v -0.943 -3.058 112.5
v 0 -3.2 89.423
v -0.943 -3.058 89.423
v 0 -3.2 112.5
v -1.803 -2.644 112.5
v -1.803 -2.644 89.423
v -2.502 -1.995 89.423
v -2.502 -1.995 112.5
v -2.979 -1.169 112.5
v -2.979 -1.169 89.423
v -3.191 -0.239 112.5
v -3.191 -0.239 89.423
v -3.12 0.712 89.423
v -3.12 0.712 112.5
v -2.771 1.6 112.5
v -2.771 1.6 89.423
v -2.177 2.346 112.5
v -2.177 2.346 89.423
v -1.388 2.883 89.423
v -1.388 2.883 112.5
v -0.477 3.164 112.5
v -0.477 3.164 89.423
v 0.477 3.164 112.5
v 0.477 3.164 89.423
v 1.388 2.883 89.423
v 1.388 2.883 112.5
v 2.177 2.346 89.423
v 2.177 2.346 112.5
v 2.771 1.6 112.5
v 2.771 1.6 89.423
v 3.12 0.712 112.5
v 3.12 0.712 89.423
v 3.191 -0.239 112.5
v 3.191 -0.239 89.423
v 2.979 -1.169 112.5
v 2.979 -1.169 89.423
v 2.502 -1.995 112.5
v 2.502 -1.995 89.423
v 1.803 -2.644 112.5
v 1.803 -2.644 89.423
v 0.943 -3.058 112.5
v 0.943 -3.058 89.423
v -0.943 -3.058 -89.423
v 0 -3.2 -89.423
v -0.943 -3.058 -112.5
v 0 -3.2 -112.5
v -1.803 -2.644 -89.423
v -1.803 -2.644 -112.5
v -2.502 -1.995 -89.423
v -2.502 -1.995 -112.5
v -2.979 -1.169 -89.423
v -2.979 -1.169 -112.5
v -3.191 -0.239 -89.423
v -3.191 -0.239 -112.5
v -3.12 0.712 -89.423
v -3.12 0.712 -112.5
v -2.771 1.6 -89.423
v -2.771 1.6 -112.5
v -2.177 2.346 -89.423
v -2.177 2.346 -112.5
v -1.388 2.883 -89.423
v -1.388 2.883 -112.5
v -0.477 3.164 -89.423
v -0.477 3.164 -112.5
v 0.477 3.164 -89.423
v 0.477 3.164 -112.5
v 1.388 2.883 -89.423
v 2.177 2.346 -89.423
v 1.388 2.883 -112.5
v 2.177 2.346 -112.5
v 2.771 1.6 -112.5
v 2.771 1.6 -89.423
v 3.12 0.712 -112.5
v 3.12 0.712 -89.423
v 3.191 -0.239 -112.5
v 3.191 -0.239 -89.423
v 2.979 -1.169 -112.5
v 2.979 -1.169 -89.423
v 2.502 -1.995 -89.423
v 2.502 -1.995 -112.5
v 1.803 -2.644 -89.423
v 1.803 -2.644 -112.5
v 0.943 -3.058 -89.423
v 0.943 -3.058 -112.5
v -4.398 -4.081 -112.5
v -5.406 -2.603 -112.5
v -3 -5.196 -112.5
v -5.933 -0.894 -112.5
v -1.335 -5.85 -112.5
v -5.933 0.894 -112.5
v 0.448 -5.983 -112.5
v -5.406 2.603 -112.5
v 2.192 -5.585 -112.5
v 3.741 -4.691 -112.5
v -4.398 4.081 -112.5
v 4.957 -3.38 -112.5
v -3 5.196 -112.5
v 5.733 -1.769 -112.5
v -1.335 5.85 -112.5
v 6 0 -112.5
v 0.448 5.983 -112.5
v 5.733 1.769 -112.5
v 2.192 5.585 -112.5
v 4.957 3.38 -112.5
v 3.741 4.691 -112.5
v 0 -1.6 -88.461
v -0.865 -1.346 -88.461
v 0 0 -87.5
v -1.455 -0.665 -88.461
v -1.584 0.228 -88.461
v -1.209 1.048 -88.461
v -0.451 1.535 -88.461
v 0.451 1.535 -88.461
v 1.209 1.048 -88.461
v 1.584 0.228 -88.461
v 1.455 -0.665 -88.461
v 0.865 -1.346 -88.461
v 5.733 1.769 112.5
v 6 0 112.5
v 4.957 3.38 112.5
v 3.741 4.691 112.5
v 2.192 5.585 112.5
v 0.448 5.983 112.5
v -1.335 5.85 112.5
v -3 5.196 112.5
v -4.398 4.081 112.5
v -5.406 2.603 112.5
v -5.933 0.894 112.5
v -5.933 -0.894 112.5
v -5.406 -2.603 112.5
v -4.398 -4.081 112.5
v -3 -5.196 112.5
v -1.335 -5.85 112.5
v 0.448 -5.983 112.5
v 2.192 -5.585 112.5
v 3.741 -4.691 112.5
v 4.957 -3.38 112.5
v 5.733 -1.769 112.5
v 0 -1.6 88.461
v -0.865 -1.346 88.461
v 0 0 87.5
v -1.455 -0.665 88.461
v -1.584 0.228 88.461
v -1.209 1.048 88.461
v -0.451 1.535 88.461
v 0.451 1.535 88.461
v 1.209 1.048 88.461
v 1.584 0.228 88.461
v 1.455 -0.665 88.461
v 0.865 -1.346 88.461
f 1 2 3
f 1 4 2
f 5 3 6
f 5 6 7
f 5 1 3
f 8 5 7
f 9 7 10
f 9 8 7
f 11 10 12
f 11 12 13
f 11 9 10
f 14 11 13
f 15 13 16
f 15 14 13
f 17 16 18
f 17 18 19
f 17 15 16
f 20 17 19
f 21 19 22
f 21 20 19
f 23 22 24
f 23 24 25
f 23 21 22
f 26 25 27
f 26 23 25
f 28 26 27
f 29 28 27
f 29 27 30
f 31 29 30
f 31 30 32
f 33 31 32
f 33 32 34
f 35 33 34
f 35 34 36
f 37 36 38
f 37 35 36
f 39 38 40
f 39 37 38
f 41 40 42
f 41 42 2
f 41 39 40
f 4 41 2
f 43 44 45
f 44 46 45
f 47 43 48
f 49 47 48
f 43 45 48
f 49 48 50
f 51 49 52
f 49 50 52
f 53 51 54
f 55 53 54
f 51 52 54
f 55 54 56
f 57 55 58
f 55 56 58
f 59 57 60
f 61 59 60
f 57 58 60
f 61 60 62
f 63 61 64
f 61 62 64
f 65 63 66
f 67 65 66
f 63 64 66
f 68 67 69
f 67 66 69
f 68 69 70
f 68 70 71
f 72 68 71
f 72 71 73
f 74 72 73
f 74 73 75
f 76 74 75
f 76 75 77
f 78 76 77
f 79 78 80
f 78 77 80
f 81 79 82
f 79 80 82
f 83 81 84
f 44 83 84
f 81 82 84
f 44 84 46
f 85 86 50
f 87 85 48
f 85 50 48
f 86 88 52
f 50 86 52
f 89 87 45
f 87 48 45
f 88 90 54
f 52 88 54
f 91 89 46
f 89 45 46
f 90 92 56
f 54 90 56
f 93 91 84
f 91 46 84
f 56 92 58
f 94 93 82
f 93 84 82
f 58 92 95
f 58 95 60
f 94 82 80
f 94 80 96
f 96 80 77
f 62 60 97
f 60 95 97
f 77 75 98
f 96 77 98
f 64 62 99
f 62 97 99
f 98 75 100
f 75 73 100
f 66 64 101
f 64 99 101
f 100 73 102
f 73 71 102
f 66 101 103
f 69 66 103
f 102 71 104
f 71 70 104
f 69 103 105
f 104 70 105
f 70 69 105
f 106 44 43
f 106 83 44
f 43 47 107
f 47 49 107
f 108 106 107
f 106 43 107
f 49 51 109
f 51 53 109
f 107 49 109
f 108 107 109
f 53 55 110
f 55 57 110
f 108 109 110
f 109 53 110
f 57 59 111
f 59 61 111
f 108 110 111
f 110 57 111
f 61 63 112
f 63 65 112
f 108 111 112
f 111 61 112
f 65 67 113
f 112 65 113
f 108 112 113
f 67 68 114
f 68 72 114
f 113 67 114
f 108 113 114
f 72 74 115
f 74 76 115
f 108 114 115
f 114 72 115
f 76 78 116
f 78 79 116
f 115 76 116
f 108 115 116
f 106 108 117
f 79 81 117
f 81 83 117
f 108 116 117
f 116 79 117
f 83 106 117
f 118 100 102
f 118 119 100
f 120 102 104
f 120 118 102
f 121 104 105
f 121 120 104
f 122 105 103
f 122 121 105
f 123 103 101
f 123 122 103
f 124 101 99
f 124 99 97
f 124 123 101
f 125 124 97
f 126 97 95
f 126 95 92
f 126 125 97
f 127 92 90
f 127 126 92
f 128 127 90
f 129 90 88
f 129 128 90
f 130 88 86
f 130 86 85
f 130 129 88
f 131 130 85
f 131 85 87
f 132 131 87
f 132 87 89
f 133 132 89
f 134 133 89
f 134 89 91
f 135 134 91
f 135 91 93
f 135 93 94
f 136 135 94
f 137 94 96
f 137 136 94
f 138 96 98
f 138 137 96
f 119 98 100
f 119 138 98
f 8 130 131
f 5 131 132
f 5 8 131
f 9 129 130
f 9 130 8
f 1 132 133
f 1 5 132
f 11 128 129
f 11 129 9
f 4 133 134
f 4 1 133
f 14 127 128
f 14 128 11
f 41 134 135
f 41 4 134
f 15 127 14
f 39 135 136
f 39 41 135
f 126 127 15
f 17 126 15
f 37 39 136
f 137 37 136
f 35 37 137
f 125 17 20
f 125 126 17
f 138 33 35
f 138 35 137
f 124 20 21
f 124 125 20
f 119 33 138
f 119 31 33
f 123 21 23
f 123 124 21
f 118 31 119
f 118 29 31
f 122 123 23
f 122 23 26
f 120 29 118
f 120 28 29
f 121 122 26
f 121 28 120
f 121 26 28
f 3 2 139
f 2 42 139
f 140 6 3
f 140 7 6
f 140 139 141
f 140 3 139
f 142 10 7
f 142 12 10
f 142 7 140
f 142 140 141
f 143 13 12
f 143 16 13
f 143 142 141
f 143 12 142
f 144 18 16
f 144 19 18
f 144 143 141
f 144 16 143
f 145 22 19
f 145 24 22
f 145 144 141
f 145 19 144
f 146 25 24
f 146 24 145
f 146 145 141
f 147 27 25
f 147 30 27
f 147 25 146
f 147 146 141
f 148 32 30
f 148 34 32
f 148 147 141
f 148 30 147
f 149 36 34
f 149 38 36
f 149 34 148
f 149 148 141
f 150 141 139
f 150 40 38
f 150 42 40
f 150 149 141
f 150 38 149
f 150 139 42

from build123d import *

# Parameters (mm, degrees)
SCHIZZO1_R                   = 6
ESTRUSIONE_ESTRUSIONE1_DEPTH = 112.5


with BuildPart() as part:
    # Schizzo1 → Estrusione-Estrusione1 (new, symmetric)
    with BuildSketch(Plane.XY):
        Circle(SCHIZZO1_R)
    extrude(amount=ESTRUSIONE_ESTRUSIONE1_DEPTH, both=True)

    # Schizzo3 → Foro per Vite M6-1 (revolve, cut)
    with BuildSketch(Plane(origin=(0, 0, 112.5), x_dir=(0, -1, 0), z_dir=(1, 0, 0))):
        Polygon((0, 0), (0, 25), (3.2, 23.077246019), (3.2, 0), align=None)
    foro_per_vite_m6_1 = revolve(axis=Axis((0, 0, 118.85), (0, 0, -1)), mode=Mode.SUBTRACT)

    # Specchia1: Foro per Vite M6-1 across plane
    add(foro_per_vite_m6_1.mirror(Plane.XY), mode=Mode.SUBTRACT)


solid = part.part
